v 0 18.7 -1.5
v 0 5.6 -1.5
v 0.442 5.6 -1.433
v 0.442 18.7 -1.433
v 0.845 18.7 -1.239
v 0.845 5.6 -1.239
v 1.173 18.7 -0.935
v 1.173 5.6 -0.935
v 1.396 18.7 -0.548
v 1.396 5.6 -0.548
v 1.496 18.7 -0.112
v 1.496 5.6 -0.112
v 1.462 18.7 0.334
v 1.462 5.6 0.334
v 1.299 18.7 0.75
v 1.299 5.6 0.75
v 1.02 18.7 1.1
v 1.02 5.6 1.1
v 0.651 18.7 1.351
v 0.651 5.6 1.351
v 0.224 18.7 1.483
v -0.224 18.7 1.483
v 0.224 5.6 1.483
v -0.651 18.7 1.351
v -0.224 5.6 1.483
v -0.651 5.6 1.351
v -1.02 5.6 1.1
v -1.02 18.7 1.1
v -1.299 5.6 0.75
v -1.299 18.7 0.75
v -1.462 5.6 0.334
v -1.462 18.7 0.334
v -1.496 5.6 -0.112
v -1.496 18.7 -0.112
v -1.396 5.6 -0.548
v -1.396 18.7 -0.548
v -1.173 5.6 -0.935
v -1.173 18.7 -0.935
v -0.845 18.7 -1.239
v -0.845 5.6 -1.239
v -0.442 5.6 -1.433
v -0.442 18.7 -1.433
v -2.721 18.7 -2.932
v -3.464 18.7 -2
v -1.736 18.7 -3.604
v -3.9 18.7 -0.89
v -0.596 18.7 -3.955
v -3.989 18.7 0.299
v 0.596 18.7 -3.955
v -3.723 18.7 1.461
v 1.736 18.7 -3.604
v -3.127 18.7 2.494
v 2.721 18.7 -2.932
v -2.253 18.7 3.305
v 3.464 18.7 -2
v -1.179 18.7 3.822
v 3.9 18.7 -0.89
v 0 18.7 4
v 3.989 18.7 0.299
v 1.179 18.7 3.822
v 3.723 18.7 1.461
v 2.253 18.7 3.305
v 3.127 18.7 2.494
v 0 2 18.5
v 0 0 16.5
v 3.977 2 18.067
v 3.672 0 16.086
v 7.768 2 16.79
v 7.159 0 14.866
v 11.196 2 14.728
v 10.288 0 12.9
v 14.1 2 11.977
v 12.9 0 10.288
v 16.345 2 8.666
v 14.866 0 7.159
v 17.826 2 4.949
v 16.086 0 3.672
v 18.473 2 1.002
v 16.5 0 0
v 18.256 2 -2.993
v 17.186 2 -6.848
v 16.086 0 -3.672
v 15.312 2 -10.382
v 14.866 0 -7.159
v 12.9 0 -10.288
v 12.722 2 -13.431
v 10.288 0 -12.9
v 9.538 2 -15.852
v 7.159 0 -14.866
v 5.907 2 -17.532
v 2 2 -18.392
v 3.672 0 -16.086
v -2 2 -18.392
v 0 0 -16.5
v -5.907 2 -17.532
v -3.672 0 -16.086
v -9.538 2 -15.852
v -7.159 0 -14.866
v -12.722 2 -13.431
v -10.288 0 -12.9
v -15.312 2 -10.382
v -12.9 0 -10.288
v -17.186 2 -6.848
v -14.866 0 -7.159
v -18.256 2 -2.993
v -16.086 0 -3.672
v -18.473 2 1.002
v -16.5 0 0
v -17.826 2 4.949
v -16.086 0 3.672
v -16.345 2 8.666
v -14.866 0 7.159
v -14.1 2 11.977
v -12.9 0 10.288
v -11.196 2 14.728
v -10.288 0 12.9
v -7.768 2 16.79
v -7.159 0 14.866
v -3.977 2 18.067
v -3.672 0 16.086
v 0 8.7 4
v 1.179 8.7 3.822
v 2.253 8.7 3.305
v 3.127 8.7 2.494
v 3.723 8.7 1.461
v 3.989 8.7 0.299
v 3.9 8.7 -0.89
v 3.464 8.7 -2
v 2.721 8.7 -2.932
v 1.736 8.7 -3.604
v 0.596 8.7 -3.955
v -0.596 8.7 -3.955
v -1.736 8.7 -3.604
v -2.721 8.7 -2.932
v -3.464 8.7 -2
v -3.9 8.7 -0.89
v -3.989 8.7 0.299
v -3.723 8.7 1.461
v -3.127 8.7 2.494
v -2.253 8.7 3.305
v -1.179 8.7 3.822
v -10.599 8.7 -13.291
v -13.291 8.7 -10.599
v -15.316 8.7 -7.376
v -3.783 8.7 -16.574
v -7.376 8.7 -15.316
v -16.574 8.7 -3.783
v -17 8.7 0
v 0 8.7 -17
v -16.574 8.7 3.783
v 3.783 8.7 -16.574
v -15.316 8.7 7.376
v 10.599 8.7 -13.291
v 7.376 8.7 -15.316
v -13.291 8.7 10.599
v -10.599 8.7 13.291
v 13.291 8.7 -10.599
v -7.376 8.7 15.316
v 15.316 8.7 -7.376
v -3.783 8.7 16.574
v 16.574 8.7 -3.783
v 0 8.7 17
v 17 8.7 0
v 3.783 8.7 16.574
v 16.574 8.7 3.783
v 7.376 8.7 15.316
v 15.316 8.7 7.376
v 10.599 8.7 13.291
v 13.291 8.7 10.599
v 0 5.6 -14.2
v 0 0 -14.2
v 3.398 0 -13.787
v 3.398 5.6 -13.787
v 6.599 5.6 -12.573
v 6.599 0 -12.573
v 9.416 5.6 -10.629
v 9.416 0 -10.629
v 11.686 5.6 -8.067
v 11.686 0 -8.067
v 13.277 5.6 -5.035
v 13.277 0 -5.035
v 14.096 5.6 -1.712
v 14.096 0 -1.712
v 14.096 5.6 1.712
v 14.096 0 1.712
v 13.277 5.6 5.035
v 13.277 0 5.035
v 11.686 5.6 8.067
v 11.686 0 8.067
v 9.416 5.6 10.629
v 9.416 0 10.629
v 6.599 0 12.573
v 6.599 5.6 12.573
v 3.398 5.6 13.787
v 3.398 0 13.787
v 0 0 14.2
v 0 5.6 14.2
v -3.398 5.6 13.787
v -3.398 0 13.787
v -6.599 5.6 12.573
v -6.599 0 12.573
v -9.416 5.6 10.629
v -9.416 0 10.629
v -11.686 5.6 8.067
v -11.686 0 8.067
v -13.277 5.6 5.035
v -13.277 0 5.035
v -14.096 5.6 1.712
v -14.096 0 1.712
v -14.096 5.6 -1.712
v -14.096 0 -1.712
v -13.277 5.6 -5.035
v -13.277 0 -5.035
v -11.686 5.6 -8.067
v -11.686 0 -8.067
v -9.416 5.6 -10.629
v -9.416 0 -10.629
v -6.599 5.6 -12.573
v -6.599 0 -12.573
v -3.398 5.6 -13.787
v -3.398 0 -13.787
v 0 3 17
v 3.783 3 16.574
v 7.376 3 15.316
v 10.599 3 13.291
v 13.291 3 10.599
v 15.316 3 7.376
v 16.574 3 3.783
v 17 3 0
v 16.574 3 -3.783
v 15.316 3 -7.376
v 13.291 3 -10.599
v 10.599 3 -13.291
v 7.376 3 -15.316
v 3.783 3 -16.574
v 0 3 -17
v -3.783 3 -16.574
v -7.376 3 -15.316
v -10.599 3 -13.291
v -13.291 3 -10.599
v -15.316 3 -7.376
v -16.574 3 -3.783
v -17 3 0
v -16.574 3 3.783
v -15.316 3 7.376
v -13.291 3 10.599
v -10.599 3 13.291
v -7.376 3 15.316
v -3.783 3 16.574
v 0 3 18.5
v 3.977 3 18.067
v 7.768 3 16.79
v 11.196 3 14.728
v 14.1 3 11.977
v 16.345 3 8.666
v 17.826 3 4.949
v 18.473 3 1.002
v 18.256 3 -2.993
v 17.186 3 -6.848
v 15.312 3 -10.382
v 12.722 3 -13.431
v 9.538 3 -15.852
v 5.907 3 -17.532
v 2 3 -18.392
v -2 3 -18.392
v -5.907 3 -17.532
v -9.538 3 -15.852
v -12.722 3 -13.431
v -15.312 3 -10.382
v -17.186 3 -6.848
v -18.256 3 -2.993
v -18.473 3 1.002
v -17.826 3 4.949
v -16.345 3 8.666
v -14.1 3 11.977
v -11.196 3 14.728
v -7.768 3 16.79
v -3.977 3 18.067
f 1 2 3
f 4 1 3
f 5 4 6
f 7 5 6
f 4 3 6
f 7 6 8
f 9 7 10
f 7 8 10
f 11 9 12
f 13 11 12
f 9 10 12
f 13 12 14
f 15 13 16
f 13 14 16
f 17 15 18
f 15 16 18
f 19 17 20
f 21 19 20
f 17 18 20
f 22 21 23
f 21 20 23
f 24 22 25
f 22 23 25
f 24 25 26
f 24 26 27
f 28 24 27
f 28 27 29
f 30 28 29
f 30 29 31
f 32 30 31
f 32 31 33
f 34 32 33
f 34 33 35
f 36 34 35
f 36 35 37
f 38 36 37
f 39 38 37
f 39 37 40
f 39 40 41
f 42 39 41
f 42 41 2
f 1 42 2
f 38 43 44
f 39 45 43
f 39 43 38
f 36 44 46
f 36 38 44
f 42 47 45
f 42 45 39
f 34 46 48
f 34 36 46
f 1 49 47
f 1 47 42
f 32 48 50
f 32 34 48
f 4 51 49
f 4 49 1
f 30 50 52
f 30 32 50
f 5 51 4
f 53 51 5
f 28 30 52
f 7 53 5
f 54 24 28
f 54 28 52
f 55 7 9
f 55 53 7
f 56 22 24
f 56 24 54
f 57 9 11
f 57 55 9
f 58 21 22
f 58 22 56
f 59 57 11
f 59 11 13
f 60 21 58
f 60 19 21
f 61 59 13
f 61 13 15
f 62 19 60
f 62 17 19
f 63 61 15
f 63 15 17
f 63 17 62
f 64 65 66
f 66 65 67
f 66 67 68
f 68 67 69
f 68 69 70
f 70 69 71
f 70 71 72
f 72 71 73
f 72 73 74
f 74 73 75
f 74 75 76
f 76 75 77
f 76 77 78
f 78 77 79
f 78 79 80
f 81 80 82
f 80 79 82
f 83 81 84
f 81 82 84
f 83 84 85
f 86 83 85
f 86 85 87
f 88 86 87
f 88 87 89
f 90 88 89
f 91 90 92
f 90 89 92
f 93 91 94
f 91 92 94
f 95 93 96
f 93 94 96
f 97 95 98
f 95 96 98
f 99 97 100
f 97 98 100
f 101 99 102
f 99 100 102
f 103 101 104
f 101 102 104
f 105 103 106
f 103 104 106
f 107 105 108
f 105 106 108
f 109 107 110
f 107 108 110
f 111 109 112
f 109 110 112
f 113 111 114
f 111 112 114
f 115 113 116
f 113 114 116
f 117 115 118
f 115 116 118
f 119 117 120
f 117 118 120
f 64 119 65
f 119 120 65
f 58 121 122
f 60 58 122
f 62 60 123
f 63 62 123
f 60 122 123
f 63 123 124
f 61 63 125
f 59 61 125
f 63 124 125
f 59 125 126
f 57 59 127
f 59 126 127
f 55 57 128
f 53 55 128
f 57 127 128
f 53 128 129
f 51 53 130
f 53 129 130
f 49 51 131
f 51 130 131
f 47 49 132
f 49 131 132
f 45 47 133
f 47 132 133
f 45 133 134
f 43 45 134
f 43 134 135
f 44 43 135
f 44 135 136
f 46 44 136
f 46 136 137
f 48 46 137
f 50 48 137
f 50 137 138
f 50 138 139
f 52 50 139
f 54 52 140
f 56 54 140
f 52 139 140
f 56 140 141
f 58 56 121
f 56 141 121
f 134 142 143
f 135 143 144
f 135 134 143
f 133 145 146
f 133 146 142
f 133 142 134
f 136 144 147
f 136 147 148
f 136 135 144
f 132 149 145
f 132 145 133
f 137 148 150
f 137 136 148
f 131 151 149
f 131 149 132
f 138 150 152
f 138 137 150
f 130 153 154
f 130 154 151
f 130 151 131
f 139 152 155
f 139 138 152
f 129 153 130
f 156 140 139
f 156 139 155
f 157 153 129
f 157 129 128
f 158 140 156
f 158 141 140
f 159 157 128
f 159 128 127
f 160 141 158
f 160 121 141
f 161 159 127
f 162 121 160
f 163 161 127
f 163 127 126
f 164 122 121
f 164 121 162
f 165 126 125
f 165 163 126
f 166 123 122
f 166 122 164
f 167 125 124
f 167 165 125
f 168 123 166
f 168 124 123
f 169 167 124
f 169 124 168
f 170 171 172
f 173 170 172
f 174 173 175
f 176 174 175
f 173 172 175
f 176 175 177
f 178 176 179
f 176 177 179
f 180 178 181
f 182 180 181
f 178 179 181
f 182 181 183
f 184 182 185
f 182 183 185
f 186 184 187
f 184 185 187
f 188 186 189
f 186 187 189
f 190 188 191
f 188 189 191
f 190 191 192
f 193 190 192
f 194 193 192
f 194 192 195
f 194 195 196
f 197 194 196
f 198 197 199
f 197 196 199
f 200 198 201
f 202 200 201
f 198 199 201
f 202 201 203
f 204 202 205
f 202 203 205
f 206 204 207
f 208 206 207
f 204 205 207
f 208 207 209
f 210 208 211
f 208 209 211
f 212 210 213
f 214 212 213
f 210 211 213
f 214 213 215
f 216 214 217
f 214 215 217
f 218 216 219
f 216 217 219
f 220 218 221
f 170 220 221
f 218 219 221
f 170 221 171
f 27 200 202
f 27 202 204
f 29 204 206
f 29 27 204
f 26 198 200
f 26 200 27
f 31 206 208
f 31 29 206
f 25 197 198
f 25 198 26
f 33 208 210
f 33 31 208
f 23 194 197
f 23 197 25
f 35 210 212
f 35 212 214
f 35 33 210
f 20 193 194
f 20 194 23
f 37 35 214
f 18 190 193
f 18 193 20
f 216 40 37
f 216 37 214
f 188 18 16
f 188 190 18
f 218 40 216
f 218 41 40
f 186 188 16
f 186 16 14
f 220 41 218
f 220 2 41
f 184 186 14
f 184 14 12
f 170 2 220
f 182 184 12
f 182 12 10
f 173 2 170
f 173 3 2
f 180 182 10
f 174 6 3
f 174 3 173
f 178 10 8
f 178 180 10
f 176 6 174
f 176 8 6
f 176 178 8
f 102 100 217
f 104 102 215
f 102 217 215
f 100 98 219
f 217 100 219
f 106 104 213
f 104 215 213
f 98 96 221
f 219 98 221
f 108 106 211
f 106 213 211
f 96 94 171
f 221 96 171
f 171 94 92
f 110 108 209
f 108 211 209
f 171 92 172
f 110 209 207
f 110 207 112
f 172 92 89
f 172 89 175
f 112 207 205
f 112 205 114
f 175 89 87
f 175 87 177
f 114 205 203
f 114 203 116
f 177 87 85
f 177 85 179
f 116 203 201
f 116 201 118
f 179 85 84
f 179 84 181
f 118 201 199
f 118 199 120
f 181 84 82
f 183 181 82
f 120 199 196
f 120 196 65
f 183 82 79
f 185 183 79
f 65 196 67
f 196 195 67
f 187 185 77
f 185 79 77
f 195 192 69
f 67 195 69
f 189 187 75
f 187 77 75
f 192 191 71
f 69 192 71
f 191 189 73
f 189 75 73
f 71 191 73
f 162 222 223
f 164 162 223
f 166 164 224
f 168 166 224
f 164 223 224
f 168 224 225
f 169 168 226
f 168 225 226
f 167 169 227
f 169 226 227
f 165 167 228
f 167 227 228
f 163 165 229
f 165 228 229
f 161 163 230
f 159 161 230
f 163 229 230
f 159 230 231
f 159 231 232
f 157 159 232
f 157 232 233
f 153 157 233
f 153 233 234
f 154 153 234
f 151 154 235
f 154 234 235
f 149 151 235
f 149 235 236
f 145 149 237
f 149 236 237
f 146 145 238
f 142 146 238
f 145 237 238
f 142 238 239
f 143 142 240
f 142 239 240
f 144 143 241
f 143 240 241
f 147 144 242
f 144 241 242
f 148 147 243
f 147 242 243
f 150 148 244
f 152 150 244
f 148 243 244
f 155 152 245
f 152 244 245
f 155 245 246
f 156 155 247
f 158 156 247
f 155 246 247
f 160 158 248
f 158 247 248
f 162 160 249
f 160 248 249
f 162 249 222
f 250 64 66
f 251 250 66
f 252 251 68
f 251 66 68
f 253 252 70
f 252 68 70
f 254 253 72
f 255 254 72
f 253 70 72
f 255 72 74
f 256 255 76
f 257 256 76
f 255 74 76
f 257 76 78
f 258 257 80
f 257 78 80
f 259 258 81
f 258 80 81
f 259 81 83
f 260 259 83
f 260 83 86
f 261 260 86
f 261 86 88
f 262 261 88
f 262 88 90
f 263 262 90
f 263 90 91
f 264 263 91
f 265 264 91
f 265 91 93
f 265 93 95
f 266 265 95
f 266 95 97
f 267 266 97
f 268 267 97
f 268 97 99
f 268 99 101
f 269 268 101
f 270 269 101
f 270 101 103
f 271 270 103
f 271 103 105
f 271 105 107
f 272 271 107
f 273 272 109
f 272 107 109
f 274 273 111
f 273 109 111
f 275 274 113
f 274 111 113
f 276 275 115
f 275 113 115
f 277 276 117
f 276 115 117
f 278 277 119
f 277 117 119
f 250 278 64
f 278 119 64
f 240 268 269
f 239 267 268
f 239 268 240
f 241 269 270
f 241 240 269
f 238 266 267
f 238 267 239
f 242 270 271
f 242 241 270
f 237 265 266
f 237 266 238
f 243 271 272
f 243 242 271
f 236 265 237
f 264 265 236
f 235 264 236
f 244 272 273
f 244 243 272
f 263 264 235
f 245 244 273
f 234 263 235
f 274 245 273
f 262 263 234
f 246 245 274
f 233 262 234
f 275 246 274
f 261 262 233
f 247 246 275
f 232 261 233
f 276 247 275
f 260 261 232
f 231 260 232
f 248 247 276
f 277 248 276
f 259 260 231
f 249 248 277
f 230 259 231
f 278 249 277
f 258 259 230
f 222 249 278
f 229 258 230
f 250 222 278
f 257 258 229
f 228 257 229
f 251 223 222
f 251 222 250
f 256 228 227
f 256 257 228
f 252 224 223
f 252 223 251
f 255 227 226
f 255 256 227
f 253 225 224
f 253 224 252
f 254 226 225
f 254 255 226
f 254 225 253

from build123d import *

# Parameters (mm, degrees)
SKETCH1_R           = 18.5
BOSS_EXTRUDE1_DEPTH = 8.7
CUT_EXTRUDE1_START  = -5.7
SKETCH2_R           = 18.5
SKETCH2_R_2         = 17
CUT_EXTRUDE1_DEPTH  = 5.7
SKETCH3_R           = 14.2
CUT_EXTRUDE2_DEPTH  = 5.6
SKETCH4_R           = 4
BOSS_EXTRUDE2_DEPTH = 10
CHAMFER1_SIZE       = 2
SKETCH5_R           = 1.5
CUT_EXTRUDE3_DEPTH  = 30.259357478


with BuildPart() as part:
    # Sketch1 → Boss-Extrude1 (new body)
    with BuildSketch(Plane(origin=(0, 0, 0), x_dir=(1, 0, 0), z_dir=(0, 1, 0))):
        with Locations(Location((0, 0, 0), (0, 0, 270))):
            Circle(SKETCH1_R)
    extrude(amount=BOSS_EXTRUDE1_DEPTH)

    # Sketch2 → Cut-Extrude1 (cut)
    with BuildSketch(Plane(origin=(0, 8.7, 0), x_dir=(1, 0, 0), z_dir=(0, 1, 0)).offset(CUT_EXTRUDE1_START)):
        with Locations(Location((0, 0, 0), (0, 0, 270))):
            Circle(SKETCH2_R)
        with Locations(Location((0, 0, 0), (0, 0, 270))):
            Circle(SKETCH2_R_2, mode=Mode.SUBTRACT)
    extrude(amount=CUT_EXTRUDE1_DEPTH, mode=Mode.SUBTRACT)

    # Sketch3 → Cut-Extrude2 (cut)
    with BuildSketch(Plane.XZ):
        with Locations(Location((0, 0, 0), (0, 0, 270))):
            Circle(SKETCH3_R)
    extrude(amount=-CUT_EXTRUDE2_DEPTH, mode=Mode.SUBTRACT)

    # Sketch4 → Boss-Extrude2 (add)
    with BuildSketch(Plane(origin=(0, 8.7, 0), x_dir=(1, 0, 0), z_dir=(0, 1, 0))):
        with Locations(Location((0, 0, 0), (0, 0, 270))):
            Circle(SKETCH4_R)
    extrude(amount=BOSS_EXTRUDE2_DEPTH)

    # Chamfer1
    chamfer1_edges = [part.edges().sort_by_distance(p)[0] for p in [
        (0, 0, -18.5),
    ]]
    chamfer(chamfer1_edges, length=CHAMFER1_SIZE)

    # Sketch5 → Cut-Extrude3 (cut, through all)
    with BuildSketch(Plane.XZ.offset(-5.6)):
        with Locations(Location((0, 0, 0), (0, 0, 270))):
            Circle(SKETCH5_R)
    extrude(amount=-CUT_EXTRUDE3_DEPTH, mode=Mode.SUBTRACT)


solid = part.part
